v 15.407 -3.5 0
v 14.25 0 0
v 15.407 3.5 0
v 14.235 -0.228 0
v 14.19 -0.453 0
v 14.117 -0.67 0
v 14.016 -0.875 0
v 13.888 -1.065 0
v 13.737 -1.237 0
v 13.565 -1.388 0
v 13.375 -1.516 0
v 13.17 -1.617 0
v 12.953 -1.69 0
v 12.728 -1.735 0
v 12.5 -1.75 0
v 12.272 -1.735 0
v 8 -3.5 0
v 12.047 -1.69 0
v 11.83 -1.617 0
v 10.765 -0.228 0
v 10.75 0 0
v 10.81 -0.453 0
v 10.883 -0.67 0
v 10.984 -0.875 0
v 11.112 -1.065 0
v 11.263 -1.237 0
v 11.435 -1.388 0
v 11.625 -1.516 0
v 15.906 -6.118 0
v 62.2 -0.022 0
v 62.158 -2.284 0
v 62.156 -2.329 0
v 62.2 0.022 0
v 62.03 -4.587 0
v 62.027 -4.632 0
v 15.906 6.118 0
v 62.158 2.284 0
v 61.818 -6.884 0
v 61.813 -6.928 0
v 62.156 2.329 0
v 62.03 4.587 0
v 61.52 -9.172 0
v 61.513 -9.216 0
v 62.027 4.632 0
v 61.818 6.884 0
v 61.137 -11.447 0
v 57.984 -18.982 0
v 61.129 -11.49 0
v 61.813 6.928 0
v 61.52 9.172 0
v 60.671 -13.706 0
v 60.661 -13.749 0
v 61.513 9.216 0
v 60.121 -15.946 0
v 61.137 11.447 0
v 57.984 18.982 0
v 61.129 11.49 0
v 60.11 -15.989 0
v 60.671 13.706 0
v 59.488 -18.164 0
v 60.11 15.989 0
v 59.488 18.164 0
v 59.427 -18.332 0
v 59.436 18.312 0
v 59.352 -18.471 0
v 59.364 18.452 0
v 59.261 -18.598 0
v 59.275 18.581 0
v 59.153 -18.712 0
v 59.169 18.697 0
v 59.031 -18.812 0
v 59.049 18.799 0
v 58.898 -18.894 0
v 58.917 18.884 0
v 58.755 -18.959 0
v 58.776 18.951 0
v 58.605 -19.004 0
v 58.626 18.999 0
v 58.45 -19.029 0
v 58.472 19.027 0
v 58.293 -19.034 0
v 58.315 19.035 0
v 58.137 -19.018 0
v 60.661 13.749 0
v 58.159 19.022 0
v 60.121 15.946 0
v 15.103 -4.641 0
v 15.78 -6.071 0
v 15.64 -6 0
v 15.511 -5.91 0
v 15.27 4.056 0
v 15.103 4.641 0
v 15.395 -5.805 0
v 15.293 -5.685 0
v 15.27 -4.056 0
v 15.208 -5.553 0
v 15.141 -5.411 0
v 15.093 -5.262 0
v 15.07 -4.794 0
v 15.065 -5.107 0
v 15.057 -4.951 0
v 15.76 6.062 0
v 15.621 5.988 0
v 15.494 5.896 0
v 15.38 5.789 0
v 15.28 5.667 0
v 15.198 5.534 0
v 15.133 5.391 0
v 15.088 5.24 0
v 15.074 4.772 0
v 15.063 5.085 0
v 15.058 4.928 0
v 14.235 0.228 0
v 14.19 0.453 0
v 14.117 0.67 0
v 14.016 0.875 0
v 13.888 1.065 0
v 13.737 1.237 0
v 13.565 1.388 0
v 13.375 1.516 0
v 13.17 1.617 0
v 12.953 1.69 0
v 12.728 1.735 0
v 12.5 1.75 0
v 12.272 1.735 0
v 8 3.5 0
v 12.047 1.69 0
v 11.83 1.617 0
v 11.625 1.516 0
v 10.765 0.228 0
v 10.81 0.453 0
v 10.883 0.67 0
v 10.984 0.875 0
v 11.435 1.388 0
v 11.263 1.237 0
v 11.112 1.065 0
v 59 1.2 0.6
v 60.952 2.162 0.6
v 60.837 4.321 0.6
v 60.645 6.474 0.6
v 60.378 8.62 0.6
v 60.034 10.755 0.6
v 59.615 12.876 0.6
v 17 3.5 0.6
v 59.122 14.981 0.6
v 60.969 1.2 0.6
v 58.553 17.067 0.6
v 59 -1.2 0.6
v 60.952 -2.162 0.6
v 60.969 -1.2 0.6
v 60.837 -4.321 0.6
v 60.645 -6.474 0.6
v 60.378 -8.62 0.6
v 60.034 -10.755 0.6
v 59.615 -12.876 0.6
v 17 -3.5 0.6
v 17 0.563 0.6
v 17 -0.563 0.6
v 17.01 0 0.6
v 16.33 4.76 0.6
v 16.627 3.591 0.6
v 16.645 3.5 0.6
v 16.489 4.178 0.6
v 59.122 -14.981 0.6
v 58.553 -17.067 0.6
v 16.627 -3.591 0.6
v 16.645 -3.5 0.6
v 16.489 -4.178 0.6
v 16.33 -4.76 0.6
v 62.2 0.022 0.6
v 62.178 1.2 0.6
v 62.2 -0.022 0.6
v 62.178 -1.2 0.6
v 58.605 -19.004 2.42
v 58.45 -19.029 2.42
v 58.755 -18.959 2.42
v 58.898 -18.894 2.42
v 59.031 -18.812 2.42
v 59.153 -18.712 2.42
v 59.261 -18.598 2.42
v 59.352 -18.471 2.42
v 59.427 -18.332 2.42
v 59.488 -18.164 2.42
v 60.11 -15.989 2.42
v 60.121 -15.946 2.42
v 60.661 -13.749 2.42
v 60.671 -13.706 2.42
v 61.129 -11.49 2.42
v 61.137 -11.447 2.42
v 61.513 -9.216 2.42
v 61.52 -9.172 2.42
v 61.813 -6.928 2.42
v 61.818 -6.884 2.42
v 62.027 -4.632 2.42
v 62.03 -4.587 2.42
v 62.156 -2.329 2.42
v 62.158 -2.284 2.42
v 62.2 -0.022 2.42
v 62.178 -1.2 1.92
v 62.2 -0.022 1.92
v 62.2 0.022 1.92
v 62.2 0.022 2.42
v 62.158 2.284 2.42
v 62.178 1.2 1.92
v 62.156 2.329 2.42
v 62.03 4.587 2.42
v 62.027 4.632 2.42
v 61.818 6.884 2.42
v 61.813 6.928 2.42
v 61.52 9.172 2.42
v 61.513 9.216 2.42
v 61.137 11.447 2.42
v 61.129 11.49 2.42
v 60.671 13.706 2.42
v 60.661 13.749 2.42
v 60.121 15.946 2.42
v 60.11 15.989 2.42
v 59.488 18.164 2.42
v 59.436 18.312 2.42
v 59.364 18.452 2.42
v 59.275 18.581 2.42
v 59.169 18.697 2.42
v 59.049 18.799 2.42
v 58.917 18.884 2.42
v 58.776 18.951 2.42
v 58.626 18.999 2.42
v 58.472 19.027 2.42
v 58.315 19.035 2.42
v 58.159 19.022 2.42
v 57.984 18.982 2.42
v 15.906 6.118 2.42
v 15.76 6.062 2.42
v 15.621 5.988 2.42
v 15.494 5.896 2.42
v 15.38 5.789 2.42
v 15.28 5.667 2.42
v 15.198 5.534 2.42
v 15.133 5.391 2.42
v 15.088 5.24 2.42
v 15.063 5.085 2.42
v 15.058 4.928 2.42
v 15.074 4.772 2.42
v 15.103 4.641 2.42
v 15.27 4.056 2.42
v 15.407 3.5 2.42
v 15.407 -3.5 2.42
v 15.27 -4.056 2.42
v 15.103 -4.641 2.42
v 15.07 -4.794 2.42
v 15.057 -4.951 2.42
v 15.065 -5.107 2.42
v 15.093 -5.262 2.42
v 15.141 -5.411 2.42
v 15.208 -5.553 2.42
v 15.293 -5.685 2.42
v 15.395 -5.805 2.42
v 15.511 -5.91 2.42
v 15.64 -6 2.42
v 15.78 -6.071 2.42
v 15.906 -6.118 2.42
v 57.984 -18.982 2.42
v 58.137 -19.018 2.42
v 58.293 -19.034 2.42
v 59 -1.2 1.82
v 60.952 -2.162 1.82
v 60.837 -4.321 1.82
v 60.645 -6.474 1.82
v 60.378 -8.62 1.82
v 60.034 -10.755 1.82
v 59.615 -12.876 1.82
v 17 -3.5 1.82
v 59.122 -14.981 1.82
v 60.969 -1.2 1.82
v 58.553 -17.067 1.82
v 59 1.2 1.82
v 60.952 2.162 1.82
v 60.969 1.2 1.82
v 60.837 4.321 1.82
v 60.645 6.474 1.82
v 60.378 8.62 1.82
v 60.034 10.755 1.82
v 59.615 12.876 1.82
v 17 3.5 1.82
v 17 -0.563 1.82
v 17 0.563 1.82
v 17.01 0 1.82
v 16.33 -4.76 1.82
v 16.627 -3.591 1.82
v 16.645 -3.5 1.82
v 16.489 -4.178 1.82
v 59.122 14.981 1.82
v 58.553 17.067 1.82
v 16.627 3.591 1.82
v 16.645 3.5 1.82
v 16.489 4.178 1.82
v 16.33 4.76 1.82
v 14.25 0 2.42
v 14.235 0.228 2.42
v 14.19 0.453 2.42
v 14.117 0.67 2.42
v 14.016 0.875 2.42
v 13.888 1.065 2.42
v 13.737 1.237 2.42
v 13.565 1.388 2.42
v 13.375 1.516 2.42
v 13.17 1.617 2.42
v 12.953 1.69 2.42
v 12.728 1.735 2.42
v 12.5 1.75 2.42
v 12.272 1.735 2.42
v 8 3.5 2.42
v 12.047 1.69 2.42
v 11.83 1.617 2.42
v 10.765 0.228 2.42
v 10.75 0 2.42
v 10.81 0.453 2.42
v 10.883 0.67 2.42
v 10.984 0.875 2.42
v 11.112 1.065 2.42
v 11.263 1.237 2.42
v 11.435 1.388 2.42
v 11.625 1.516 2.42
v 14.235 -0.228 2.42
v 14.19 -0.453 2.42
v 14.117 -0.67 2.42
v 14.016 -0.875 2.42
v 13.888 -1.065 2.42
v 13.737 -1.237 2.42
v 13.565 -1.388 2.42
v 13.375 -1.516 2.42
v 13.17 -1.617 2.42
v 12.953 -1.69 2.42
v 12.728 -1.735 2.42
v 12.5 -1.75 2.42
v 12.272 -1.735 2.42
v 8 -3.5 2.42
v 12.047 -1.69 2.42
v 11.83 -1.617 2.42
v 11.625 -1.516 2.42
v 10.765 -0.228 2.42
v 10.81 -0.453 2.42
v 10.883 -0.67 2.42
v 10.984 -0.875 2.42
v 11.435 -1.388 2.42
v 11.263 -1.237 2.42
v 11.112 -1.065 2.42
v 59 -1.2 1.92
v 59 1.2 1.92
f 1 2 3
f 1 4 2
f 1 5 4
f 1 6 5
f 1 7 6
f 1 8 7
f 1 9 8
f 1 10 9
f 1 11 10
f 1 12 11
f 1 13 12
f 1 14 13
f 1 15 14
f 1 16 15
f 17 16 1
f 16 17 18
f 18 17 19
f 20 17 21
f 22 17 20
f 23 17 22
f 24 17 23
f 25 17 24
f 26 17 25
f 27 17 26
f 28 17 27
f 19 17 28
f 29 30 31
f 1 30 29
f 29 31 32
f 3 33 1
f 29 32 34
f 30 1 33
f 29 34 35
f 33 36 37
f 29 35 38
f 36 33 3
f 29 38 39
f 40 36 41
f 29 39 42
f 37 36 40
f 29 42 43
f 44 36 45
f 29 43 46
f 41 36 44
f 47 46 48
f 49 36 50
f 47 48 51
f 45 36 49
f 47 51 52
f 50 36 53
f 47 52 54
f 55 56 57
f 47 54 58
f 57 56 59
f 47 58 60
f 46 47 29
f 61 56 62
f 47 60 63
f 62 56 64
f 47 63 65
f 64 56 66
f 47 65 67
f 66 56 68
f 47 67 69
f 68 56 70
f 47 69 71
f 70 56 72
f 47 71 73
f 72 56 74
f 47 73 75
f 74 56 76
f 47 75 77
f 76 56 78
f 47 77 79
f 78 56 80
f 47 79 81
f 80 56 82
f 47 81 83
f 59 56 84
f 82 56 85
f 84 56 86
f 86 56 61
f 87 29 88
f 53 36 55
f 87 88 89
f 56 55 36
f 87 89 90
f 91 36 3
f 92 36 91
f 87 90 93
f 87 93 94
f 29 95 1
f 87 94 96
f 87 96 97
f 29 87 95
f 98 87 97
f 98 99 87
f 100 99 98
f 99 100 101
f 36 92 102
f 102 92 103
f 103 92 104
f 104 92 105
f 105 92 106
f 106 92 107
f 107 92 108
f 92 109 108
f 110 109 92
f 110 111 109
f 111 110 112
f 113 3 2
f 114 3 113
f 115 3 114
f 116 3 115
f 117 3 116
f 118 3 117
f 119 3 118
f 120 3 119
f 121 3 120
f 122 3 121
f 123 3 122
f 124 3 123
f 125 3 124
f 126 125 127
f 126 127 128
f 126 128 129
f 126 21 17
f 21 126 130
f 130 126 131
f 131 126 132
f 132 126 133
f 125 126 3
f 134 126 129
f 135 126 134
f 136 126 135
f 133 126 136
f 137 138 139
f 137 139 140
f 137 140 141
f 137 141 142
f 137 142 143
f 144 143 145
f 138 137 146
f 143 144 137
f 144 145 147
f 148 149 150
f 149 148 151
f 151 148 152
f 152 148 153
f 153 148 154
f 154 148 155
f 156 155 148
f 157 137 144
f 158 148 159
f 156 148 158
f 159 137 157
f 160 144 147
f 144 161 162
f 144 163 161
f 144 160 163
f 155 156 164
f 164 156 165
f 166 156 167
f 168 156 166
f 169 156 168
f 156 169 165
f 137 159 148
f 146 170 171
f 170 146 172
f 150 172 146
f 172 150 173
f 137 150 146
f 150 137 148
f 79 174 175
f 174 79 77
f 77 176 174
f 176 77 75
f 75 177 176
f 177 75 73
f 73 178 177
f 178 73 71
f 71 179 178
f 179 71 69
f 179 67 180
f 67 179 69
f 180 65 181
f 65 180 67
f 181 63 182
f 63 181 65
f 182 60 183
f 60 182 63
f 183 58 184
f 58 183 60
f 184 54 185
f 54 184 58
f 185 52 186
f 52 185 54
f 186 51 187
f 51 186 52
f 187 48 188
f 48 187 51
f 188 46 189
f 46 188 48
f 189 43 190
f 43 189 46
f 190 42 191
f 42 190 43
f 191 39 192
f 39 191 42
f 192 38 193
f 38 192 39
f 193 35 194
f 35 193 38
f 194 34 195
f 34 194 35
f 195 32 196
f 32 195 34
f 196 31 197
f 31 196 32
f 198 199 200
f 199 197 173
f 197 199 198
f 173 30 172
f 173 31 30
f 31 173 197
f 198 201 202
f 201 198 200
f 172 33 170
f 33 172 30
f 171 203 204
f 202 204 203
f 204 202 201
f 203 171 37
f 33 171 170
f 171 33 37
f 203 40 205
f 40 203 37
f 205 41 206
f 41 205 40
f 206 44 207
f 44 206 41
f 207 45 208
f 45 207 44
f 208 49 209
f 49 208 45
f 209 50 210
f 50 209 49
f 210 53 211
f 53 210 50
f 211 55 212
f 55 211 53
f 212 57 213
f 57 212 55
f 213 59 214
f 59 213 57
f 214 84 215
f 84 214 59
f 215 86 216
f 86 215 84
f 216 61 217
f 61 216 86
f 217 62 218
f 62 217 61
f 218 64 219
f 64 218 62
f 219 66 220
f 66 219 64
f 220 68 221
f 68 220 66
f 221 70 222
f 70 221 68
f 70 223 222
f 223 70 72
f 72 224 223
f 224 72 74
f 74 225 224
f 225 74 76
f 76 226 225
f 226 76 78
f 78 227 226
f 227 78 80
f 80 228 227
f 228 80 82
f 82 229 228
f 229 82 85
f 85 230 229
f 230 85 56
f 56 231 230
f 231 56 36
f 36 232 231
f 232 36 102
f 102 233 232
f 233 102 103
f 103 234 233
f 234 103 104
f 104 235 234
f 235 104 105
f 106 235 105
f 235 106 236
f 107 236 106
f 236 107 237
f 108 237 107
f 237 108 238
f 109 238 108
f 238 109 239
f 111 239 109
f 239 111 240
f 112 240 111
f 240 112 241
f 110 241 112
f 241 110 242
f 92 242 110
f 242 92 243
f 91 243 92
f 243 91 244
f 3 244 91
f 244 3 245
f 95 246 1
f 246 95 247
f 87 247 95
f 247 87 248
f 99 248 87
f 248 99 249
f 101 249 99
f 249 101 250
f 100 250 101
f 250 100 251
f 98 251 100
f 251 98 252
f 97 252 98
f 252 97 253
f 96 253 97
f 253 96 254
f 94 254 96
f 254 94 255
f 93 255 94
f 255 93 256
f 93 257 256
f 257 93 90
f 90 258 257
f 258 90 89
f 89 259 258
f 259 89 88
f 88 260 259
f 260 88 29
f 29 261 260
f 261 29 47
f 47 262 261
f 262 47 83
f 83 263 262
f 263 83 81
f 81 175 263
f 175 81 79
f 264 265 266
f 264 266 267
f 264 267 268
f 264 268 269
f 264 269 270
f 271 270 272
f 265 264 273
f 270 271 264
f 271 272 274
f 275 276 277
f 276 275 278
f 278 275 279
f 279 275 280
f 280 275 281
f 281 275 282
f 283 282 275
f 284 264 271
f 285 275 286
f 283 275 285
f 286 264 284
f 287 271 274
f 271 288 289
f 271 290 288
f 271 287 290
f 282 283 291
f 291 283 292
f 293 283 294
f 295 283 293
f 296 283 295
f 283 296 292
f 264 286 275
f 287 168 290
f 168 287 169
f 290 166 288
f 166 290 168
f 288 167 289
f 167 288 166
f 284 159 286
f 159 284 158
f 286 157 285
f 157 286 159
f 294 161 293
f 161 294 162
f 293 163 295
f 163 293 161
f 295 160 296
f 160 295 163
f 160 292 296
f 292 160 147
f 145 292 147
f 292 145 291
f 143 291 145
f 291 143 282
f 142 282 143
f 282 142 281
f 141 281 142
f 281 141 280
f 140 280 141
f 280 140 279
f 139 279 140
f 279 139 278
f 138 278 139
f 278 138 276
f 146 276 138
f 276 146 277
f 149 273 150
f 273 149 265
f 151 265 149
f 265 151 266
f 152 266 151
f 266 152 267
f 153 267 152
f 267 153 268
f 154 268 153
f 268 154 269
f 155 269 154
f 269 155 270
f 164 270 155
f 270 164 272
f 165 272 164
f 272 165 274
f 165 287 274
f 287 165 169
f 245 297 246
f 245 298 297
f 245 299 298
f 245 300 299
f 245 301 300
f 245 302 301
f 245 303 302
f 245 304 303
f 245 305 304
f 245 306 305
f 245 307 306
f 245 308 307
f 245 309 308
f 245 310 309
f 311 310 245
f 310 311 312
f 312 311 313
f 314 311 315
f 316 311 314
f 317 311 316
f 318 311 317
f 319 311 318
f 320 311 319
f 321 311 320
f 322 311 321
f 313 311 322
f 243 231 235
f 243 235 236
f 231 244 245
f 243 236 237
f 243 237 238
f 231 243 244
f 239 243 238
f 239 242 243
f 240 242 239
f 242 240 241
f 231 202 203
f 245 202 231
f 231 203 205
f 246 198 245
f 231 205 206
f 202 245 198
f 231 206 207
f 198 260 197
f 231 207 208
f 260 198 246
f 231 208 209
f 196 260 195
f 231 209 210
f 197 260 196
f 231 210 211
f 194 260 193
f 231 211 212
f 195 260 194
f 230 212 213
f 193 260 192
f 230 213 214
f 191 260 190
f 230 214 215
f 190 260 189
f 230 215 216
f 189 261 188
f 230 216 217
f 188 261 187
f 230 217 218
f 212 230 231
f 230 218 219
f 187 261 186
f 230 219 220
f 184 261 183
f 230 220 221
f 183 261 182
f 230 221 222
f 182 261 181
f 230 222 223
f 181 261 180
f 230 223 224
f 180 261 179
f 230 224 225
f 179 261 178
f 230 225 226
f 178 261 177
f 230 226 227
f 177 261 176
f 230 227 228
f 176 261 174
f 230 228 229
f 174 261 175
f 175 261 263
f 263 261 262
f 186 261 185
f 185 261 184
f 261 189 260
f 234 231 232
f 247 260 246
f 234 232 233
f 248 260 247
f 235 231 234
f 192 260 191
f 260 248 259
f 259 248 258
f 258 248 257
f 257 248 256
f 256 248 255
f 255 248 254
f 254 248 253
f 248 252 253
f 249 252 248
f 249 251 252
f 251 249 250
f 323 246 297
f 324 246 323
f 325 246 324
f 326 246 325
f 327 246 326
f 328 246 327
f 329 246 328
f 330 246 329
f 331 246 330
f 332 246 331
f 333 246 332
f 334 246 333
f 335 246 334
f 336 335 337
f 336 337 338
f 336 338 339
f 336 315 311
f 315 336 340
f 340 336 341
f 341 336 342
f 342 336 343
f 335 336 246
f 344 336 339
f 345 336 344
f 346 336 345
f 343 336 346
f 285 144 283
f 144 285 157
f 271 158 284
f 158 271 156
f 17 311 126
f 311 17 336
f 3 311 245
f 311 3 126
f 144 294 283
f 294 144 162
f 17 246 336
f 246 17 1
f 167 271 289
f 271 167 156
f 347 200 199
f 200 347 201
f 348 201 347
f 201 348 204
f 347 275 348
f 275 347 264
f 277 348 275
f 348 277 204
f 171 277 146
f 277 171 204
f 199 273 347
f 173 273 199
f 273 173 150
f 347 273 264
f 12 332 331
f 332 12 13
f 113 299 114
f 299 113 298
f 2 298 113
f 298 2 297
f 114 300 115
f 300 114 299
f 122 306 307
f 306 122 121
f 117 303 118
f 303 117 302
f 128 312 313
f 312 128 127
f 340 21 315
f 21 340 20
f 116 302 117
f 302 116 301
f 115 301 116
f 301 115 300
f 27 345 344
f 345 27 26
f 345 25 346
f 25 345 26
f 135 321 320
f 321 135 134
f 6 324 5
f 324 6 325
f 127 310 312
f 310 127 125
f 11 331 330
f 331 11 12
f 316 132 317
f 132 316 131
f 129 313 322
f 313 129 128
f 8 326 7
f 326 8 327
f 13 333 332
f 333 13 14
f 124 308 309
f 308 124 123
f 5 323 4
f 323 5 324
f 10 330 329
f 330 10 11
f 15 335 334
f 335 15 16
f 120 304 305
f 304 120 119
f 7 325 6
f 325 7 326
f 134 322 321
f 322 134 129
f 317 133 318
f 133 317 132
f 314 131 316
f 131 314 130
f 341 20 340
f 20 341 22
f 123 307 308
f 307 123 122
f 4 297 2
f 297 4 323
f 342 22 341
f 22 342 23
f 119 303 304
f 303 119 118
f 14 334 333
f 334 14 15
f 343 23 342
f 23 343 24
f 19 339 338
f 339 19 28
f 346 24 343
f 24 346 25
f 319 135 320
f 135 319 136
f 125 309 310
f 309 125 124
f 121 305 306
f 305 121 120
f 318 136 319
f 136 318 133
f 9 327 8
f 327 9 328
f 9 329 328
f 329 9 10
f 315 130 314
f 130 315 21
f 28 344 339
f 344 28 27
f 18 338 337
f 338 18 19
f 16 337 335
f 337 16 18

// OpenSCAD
// file: parameters.scad
// =============================================================================
// Gen-AU Stacked dual-stator mid-rotor copper-max mega - WOUND-AWARE (HARD GATE)
// ONE mid dual-face Halbach rotor | TWO wound pancake stators | 18 coils x180 t
// =============================================================================

wire_awg            = 26;
wire_od             = 0.45;
turns               = 180;      // +5 vs Gen-AR 175; 18x180x~0.116 ~ 376 m
fill                = 0.70;
layers_per_face     = 2;
wind_build_axial    = layers_per_face * wire_od * fill;   // 0.63
wind_build_radial   = 3 * wire_od * fill;                 // 0.945

coil_id_r           = 17.0;
coil_od_r           = 61.0;
span_deg            = 34.0;     // 9 stations x 40 deg
former_web          = 1.22;     // thinner vs AR 1.25
flange_t            = 0.60;
wall                = 1.2;
slot_w              = 2.4;
mount_hole          = 3.5;
tab_len             = 7.0;

former_bare_h       = former_web + 2 * flange_t;            // 2.42
coil_envelope_h     = former_bare_h + 2 * wind_build_axial; // 3.68

run_clear           = 0.50;
gap_spacer_h        = run_clear + wind_build_axial;         // 1.13
m2m                 = coil_envelope_h + 2 * run_clear;      // 4.68 per gap

coil_stations       = 9;        // per stator; x2 = 18 total
bay_r_in            = coil_id_r - 2.0 - wind_build_radial;
bay_r_out           = coil_od_r + 2.0 + wind_build_radial;
bay_span            = span_deg + 4.0;
bay_offset          = 2.0;
bay_depth           = former_bare_h + wind_build_axial;     // wound sits in bay
stator_back_web     = 2.0;
stator_thick        = bay_depth + stator_back_web;
stator_od           = 156.0;
shaft_clear_stator  = 38.0;
coil_mount_r        = 27.0;

large_pocket_d      = 20.3;
small_pocket_d      = 5.3;
pocket_h            = 5.2;
large_n             = 8;
R_large             = 39.0;     // tighter copper overlap vs AR R=39.5
R_small_inner       = 25.5;
R_small_mid         = 39.0;
R_small_outer       = 55.5;
carrier_od          = 154.0;
mid_carrier_thick   = 12.0;
hub_h               = 10.0;
hub_od              = 30.0;
rotor_b_offset_deg  = 22.5;

shaft_bore          = 8.35;
bearing_d           = 21.85;
bearing_h           = 7.2;
m3_clear            = 3.5;
bolt_r_inner        = 36.0;
bolt_n_inner        = 6;
flange_bolt_r       = 72.0;
flange_bolt_n       = 6;
brace_r             = 68.0;
brace_d             = 4.3;
brace_n             = 4;

spacer_pad_od       = 14.0;
spacer_pad_id       = m3_clear;
endbell_od          = 156.0;
endbell_thick       = 8.0;
endbell_shaft_clear = 10.0;

$fn = 64;
// main file
// Gen-AU pancake former — wind BEFORE assembly
include <parameters.scad>;
$fn = 48;

module sector_2d(r_in, r_out, ang) {
    polygon([
        for (a = [-ang/2 : ang/16 : ang/2]) [r_in*cos(a), r_in*sin(a)],
        for (a = [ang/2 : -ang/16 : -ang/2]) [r_out*cos(a), r_out*sin(a)]
    ]);
}
module flange() {
    linear_extrude(flange_t) offset(r=wall) sector_2d(coil_id_r, coil_od_r, span_deg);
}
difference() {
    union() {
        flange();
        translate([0, 0, flange_t])
            linear_extrude(former_web)
                difference() {
                    offset(r=wall) sector_2d(coil_id_r, coil_od_r, span_deg);
                    sector_2d(coil_id_r + 0.01, coil_od_r - 0.01, span_deg - 1.5);
                }
        translate([0, 0, flange_t + former_web]) flange();
        translate([coil_id_r - tab_len - 2, -3.5, 0])
            cube([tab_len + 2, 7, former_bare_h]);
    }
    translate([coil_od_r - 2, -slot_w/2, flange_t])
        cube([wall + 4, slot_w, former_web + 0.1]);
    translate([coil_id_r - tab_len/2 - 1, 0, -0.1])
        cylinder(d=mount_hole, h=former_bare_h + 1);
}
